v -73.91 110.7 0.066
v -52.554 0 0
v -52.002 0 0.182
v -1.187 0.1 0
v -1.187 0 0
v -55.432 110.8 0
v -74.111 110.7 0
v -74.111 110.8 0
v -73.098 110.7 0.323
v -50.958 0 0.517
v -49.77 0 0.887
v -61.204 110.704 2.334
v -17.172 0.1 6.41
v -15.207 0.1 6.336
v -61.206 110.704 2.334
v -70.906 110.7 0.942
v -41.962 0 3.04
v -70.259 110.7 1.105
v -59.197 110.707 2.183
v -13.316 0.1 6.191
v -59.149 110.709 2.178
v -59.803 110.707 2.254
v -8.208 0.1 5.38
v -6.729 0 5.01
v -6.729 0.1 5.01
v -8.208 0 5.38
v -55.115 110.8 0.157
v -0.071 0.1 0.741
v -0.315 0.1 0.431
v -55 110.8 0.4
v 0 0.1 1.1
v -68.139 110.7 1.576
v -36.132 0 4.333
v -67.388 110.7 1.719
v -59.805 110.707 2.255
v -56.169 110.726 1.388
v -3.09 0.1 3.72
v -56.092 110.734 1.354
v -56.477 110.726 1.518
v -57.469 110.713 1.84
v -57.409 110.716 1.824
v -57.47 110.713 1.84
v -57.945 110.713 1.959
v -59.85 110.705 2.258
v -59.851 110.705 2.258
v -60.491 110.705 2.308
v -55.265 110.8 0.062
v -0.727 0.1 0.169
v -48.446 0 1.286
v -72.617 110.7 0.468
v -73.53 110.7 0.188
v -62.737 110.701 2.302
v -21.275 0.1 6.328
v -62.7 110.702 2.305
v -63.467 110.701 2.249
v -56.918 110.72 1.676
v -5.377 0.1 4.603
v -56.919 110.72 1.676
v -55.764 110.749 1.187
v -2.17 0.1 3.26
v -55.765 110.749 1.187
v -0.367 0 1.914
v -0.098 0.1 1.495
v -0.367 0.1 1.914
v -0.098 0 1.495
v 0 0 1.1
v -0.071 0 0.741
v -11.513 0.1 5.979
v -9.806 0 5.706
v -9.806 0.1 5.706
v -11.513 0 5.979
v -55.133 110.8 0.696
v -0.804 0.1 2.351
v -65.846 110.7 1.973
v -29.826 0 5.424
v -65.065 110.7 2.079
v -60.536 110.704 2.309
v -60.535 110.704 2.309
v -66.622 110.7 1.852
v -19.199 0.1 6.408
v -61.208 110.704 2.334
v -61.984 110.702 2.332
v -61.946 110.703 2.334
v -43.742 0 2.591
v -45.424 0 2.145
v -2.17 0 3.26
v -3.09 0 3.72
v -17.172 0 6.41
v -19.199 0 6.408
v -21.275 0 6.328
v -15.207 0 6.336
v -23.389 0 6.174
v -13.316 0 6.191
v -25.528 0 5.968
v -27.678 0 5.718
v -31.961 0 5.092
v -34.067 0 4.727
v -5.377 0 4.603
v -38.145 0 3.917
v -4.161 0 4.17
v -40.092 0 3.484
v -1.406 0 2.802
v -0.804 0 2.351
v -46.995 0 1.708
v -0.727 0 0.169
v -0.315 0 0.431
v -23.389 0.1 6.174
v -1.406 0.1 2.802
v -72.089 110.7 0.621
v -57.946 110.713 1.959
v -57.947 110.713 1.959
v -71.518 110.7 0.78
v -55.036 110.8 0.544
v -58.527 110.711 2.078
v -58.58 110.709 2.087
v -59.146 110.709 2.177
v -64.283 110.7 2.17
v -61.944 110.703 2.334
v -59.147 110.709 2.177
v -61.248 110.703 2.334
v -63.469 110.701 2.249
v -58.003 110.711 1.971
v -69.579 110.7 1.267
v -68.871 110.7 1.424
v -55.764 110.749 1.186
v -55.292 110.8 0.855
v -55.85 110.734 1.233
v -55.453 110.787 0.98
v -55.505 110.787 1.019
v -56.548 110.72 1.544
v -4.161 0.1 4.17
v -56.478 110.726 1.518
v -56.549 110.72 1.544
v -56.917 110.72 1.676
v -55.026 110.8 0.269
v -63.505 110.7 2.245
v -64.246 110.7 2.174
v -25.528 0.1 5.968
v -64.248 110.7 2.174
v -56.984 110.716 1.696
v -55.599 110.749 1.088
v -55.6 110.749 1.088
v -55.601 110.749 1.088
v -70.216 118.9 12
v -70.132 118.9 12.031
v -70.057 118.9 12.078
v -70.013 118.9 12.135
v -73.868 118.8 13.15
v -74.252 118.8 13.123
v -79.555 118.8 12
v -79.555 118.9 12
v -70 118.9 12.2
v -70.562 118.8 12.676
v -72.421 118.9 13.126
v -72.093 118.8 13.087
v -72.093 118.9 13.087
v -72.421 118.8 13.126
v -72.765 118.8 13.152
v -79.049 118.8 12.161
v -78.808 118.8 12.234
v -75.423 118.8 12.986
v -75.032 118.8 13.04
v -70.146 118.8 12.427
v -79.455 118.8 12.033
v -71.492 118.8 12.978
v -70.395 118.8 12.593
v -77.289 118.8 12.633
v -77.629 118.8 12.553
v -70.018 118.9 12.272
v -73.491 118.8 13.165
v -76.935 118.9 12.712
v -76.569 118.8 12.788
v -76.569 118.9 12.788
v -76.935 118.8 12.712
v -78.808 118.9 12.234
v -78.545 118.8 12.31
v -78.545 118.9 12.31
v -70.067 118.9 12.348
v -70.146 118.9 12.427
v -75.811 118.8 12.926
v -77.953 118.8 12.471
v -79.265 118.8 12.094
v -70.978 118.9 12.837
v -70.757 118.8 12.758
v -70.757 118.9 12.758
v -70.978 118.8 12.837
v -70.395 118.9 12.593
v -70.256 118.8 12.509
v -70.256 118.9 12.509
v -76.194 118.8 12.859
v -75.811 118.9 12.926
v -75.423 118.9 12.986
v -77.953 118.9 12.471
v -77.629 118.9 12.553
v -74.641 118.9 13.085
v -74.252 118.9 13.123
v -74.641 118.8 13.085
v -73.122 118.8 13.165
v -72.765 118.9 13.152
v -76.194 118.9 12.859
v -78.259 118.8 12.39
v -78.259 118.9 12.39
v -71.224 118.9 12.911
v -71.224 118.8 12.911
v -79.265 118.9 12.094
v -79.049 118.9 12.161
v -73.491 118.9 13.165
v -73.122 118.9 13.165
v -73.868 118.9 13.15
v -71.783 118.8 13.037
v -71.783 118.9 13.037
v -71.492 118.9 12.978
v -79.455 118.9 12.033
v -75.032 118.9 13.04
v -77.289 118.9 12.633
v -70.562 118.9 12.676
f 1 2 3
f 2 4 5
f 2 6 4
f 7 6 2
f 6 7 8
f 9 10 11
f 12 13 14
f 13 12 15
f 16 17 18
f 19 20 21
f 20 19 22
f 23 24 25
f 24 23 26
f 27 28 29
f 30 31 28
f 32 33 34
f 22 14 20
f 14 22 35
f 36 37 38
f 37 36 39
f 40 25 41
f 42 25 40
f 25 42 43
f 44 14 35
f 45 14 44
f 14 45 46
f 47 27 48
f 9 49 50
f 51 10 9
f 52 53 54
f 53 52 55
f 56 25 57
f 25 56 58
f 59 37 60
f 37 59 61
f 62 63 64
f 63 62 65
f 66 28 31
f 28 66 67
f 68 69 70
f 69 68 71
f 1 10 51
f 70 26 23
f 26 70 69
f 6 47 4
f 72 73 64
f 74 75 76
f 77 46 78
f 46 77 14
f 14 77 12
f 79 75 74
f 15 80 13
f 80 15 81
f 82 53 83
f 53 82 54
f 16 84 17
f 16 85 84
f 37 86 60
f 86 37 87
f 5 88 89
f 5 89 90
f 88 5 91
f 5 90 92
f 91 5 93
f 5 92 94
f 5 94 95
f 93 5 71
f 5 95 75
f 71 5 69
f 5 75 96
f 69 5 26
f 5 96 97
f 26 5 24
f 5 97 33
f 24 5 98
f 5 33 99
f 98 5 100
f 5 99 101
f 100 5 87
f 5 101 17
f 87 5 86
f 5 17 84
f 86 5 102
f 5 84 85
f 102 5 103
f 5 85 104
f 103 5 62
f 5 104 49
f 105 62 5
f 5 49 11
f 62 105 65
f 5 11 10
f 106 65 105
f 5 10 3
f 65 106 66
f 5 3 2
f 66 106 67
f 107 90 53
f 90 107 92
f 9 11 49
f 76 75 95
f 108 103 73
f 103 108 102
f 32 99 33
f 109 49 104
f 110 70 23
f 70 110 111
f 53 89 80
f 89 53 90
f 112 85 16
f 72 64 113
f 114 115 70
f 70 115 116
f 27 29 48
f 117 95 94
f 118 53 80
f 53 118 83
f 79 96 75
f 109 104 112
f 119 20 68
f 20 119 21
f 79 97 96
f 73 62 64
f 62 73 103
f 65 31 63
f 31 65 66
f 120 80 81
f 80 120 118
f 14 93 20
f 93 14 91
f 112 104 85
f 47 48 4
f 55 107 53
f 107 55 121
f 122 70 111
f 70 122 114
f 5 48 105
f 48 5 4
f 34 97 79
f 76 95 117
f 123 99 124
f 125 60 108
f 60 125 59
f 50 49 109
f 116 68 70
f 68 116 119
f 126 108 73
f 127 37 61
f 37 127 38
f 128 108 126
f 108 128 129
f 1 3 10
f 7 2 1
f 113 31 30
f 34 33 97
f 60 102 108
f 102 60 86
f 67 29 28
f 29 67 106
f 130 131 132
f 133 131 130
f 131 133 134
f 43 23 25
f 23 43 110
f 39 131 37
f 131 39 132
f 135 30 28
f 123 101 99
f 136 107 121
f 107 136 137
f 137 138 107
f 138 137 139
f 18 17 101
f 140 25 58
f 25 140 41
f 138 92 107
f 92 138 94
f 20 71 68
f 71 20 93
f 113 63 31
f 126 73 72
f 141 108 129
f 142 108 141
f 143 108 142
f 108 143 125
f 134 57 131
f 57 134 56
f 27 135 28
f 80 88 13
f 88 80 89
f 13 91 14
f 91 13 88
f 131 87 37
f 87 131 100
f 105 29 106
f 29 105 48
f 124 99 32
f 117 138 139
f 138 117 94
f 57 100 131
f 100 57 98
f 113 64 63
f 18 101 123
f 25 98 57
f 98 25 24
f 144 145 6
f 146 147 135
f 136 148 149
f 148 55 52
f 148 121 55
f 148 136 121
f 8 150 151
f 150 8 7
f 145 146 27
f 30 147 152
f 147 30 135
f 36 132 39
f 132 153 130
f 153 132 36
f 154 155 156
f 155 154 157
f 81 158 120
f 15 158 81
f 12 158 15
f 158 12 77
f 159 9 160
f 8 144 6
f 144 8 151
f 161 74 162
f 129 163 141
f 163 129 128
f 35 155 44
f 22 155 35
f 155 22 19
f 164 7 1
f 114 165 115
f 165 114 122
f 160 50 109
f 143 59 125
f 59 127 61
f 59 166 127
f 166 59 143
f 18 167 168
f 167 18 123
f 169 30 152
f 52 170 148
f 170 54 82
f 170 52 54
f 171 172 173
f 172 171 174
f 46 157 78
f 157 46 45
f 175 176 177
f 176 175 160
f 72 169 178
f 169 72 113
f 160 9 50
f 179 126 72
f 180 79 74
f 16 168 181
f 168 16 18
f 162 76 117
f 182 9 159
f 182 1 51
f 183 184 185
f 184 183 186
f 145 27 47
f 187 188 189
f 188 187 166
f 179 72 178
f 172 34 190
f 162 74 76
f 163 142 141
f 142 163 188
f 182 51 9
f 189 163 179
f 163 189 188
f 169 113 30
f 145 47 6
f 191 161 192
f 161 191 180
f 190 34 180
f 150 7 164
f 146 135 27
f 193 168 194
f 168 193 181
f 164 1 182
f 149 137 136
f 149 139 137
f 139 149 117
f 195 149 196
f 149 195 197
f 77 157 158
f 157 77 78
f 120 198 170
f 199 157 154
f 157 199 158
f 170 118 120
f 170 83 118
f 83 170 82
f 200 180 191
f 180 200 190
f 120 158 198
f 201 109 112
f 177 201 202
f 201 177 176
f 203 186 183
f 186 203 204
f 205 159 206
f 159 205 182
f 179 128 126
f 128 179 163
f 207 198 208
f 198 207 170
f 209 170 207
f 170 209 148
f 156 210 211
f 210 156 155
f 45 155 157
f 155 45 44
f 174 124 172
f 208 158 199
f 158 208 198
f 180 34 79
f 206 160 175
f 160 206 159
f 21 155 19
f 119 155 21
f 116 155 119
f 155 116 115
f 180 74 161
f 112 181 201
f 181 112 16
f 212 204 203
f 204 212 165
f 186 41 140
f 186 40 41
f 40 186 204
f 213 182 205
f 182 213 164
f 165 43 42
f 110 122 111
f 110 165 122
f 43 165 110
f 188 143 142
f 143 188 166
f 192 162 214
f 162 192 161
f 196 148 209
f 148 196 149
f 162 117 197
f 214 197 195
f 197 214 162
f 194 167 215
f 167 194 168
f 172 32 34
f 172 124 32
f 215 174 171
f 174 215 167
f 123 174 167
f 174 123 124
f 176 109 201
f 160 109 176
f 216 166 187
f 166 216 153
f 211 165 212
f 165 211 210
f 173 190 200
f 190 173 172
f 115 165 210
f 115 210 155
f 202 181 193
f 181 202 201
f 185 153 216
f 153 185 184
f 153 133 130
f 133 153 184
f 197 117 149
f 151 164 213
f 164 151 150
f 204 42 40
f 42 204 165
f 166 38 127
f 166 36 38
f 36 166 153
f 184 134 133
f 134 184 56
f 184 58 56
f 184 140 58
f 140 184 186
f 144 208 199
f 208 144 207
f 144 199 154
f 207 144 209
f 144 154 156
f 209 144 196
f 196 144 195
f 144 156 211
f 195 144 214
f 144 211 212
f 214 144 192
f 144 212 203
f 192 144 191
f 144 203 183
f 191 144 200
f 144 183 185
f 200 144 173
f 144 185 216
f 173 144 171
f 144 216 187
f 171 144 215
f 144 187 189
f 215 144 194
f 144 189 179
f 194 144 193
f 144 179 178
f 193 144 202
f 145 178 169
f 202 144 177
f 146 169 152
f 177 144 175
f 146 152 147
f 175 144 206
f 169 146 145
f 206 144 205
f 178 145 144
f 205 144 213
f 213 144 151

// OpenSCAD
// file: motor.scad
/*
    Motor mounts for the OpenSCAD aeroplane

    Copyright (C) Tim Molteno, tim@molteno.net

    
    This program is free software: you can redistribute it and/or modify
    it under the terms of the GNU General Public License as published by
    the Free Software Foundation, either version 3 of the License, or
    (at your option) any later version.

    This program is distributed in the hope that it will be useful,
    but WITHOUT ANY WARRANTY; without even the implied warranty of
    MERCHANTABILITY or FITNESS FOR A PARTICULAR PURPOSE.  See the
    GNU General Public License for more details.

    You should have received a copy of the GNU General Public License
    along with this program.  If not, see <http://www.gnu.org/licenses/>.
*/

module motor_mount() {
  difference() {
    union() {
      cylinder(r=6.5, h=10);
      translate([0,0,0.75]) cube([26,7 ,1.5], center=true);
      translate([0,0,0.75]) cube([7, 26,1.5], center=true);
    }
    cylinder(r=4, h=12, center=true);
    for (angle = [0,90,180,270]) {
      rotate(angle) translate([10,0,0]) cylinder(r=1.5, h=5, center=true);
    }
  }
}

/* Turnigy 2730-1500 */
module motor() {
  rotate([0,90,0]) {
    motor_mount();
    color("silver") cylinder(r=1.5, h=42); // shaft
    color("gold") translate([0,0,3]) cylinder(r=4, h=15); // housing
    color("red") translate([0,0,18]) cylinder(r=13.5, h=10); // outrunner
    translate([0,0,28]) cylinder(r=4, h=4.5); // forward housing
  }
}


/* Turnigy nano-tech 300mAH 2S 35-70C */
module battery() {
  cube([46, 18,12.5], center=true);
}


/* Servo. Turnigy TG9e */

module servo() {
  rotate([0,0,90]) {
    translate([-6, -11.5,0]) cube([12, 23, 23]);
    translate([-6,-16.25,16.5]) cube([12, 32.5, 2]);
    translate([0,0,23]) cylinder(r=6, h=4);
    translate([0,0,27]) cylinder(r=2.5, h=2.5);
  }
}

module servo_arm() {
  cylinder(r=3.5, h=4);
  translate([0,0,2.5]) hull() {
    cylinder(r=3.5, h=1.5);
    translate([14,0,0]) cylinder(r=2, h=1.5);
  }
}

motor();
// file: glider.scad
/*
    Openscad Aeroplane.

    Copyright (C) 2014 Tim Molteno, tim@molteno.net

    
    This program is free software: you can redistribute it and/or modify
    it under the terms of the GNU General Public License as published by
    the Free Software Foundation, either version 3 of the License, or
    (at your option) any later version.

    This program is distributed in the hope that it will be useful,
    but WITHOUT ANY WARRANTY; without even the implied warranty of
    MERCHANTABILITY or FITNESS FOR A PARTICULAR PURPOSE.  See the
    GNU General Public License for more details.

    You should have received a copy of the GNU General Public License
    along with this program.  If not, see <http://www.gnu.org/licenses/>.
*/

/* NACA 5412 Airfoil M=5.0% P=40.0% T=12.0% */

module airfoil(s) {
rotate([0,0,2]) scale([s,s,s]) mirror([1,0])  polygon(points=[
 [1.000000,-0.000000], [0.998459, 0.000480], [0.993844, 0.001912], [0.986185, 0.004266],
 [0.975528, 0.007497], [0.961940, 0.011541], [0.945503, 0.016321], [0.926320, 0.021747],
 [0.904508, 0.027720], [0.880203, 0.034131], [0.853553, 0.040868], [0.824724, 0.047815],
 [0.793893, 0.054856], [0.761249, 0.061875], [0.726995, 0.068760], [0.691342, 0.075399],
 [0.654508, 0.081690], [0.616723, 0.087531], [0.578217, 0.092831], [0.539230, 0.097504],
 [0.500000, 0.101473], [0.460770, 0.104671], [0.421783, 0.107042], [0.383277, 0.108495],
 [0.345492, 0.108628], [0.308658, 0.107381], [0.273005, 0.104801], [0.238751, 0.100962],
 [0.206107, 0.095964], [0.175276, 0.089926], [0.146447, 0.082992], [0.119797, 0.075318],
 [0.095492, 0.067072], [0.073680, 0.058429], [0.054497, 0.049563], [0.038060, 0.040642],
 [0.024472, 0.031824], [0.013815, 0.023248], [0.006156, 0.015030], [0.001541, 0.007261],
 [0.000000, 0.000000], [0.001541,-0.006492], [0.006156,-0.011976], [0.013815,-0.016460],
 [0.024472,-0.019963], [0.038060,-0.022517], [0.054497,-0.024170], [0.073680,-0.024982],
 [0.095492,-0.025026], [0.119797,-0.024389], [0.146447,-0.023173], [0.175276,-0.021490],
 [0.206107,-0.019460], [0.238751,-0.017213], [0.273005,-0.014881], [0.308658,-0.012596],
 [0.345492,-0.010485], [0.383277,-0.008670], [0.421783,-0.007174], [0.460770,-0.005697],
 [0.500000,-0.004250], [0.539230,-0.002888], [0.578217,-0.001653], [0.616723,-0.000578],
 [0.654508, 0.000317], [0.691342, 0.001023], [0.726995, 0.001539], [0.761249, 0.001875],
 [0.793893, 0.002047], [0.824724, 0.002077], [0.853553, 0.001991], [0.880203, 0.001815],
 [0.904508, 0.001578], [0.926320, 0.001305], [0.945503, 0.001019], [0.961940, 0.000743],
 [0.975528, 0.000494], [0.986185, 0.000286], [0.993844, 0.000130], [0.998459, 0.000033],
 [1.000000, 0.000000]]);
}

/* This is a foil with a flat bottom for easy printing */
module flat_foil(s) {
  difference() {
    translate([0,0.02*s, 0]) linear_extrude(height=0.1) airfoil(s);
    translate([-s, -s-5, -1]) cube([s+5,s+5,2]);
  }
}
	
wingspan = 135;
tail_length = 95;
nose_length = 40;

wing_x = 25;
wing_chord = 55;
wing_z = -10;

servo_z = -5;

dihedral_angle = 15;

module wing_left() {
  rotate([90,0,0]) {
    hull() {
      translate([-55,0,0.82*wingspan]) flat_foil(20);
      flat_foil(wing_chord);
    }
    hull() {
      translate([-55,0,0.82*wingspan]) flat_foil(20);
      translate([-70,12,0.88*wingspan]) flat_foil(10);
    }
  }
}

module wing_center() {
  difference() {
    rotate([90,0,0]) hull() {
      translate([0,0,wingspan/2]) flat_foil(wing_chord);
      translate([0,0,-wingspan/2]) flat_foil(wing_chord);
    }
    translate([0, wingspan/2,0]) rotate([dihedral_angle,0,0]) wing_right();
    translate([0, -wingspan/2,0]) rotate([-dihedral_angle,0,0])  wing_left();
  }
}


module wing_right() {
  mirror([0,1,0]) wing_left();
}

module wings() {
    translate([wing_x,0,wing_z]) {
      wing_center();
      translate([0, wingspan/2,0]) rotate([dihedral_angle,0,0]) wing_right();
      translate([0, -wingspan/2,0]) rotate([-dihedral_angle,0,0])  wing_left();
    }
}




/** FUSELAGE **/

use <motor.scad>;

module firewall() {
   rotate([0,90,0]) difference() {
	cylinder(r=13.5, h=5, $fn=21);
    for (angle = [0,90,180,270]) {
      rotate(angle) translate([10,0,0]) cylinder(r=1.5, h=12, center=true);
    }
  }
}

module fuselage_plain() {
    %translate([nose_length+5,0,0]) motor();
    translate([nose_length,0,0]) firewall();
    hull() {
      translate([nose_length-5,0,0]) firewall();
      sphere(r=20, $fn=21);
      translate([-tail_length-20,0,2]) sphere(r=5, $fn=21);
    }
}

module fuselage() {
  difference() {
    fuselage_plain();
    wings();
    translate([-tail_length,0,0]) stabilizers();
    #translate([0,0,10]) battery();
    #translate([-70,0,servo_z]) servo();
    #translate([-35,0,servo_z]) servo();
  }
}



/** STABILIZERS **/

module stabilizer_right() {
  hull() {
    translate([-20,0,0]) cube([20,2,1.5]);
    translate([-12, 40, 0]) cylinder(r=6, h=0.6);
  }
}

module stabilizer_left() {
  mirror([0,1,0]) stabilizer_right();
}


module rudder() {
  cube([25,1,38]);
}


module stabilizer_vert() {
  translate([-20,0,0])
  hull() {
    translate([0, -1, 1]) cube([20,2,1]);
    translate([4, 0, 40]) rotate([90,0,0]) cylinder(r=4, h=0.8);
  }
}

module stabilizers() {
    stabilizer_right();
    stabilizer_left();
    stabilizer_vert();
    translate([-46,0,5]) rudder();
}


/* This is the whole plane, as assembled. To print, you
   must generate a separate .stl for each of these parts
*/
module plane() {
  union() {
    fuselage();
    wings();
    translate([10,0,40]) wings();
    translate([-tail_length,0,0]) stabilizers();
  }
}

plane();
// main file
/*
	Openscad glider.

    The right wing tip

    Copyright (C) 2014 Tim Molteno, tim@molteno.net

    
    This program is free software: you can redistribute it and/or modify
    it under the terms of the GNU General Public License as published by
    the Free Software Foundation, either version 3 of the License, or
    (at your option) any later version.

    This program is distributed in the hope that it will be useful,
    but WITHOUT ANY WARRANTY; without even the implied warranty of
    MERCHANTABILITY or FITNESS FOR A PARTICULAR PURPOSE.  See the
    GNU General Public License for more details.

    You should have received a copy of the GNU General Public License
    along with this program.  If not, see <http://www.gnu.org/licenses/>.
*/
use <glider.scad>;

wing_right();
